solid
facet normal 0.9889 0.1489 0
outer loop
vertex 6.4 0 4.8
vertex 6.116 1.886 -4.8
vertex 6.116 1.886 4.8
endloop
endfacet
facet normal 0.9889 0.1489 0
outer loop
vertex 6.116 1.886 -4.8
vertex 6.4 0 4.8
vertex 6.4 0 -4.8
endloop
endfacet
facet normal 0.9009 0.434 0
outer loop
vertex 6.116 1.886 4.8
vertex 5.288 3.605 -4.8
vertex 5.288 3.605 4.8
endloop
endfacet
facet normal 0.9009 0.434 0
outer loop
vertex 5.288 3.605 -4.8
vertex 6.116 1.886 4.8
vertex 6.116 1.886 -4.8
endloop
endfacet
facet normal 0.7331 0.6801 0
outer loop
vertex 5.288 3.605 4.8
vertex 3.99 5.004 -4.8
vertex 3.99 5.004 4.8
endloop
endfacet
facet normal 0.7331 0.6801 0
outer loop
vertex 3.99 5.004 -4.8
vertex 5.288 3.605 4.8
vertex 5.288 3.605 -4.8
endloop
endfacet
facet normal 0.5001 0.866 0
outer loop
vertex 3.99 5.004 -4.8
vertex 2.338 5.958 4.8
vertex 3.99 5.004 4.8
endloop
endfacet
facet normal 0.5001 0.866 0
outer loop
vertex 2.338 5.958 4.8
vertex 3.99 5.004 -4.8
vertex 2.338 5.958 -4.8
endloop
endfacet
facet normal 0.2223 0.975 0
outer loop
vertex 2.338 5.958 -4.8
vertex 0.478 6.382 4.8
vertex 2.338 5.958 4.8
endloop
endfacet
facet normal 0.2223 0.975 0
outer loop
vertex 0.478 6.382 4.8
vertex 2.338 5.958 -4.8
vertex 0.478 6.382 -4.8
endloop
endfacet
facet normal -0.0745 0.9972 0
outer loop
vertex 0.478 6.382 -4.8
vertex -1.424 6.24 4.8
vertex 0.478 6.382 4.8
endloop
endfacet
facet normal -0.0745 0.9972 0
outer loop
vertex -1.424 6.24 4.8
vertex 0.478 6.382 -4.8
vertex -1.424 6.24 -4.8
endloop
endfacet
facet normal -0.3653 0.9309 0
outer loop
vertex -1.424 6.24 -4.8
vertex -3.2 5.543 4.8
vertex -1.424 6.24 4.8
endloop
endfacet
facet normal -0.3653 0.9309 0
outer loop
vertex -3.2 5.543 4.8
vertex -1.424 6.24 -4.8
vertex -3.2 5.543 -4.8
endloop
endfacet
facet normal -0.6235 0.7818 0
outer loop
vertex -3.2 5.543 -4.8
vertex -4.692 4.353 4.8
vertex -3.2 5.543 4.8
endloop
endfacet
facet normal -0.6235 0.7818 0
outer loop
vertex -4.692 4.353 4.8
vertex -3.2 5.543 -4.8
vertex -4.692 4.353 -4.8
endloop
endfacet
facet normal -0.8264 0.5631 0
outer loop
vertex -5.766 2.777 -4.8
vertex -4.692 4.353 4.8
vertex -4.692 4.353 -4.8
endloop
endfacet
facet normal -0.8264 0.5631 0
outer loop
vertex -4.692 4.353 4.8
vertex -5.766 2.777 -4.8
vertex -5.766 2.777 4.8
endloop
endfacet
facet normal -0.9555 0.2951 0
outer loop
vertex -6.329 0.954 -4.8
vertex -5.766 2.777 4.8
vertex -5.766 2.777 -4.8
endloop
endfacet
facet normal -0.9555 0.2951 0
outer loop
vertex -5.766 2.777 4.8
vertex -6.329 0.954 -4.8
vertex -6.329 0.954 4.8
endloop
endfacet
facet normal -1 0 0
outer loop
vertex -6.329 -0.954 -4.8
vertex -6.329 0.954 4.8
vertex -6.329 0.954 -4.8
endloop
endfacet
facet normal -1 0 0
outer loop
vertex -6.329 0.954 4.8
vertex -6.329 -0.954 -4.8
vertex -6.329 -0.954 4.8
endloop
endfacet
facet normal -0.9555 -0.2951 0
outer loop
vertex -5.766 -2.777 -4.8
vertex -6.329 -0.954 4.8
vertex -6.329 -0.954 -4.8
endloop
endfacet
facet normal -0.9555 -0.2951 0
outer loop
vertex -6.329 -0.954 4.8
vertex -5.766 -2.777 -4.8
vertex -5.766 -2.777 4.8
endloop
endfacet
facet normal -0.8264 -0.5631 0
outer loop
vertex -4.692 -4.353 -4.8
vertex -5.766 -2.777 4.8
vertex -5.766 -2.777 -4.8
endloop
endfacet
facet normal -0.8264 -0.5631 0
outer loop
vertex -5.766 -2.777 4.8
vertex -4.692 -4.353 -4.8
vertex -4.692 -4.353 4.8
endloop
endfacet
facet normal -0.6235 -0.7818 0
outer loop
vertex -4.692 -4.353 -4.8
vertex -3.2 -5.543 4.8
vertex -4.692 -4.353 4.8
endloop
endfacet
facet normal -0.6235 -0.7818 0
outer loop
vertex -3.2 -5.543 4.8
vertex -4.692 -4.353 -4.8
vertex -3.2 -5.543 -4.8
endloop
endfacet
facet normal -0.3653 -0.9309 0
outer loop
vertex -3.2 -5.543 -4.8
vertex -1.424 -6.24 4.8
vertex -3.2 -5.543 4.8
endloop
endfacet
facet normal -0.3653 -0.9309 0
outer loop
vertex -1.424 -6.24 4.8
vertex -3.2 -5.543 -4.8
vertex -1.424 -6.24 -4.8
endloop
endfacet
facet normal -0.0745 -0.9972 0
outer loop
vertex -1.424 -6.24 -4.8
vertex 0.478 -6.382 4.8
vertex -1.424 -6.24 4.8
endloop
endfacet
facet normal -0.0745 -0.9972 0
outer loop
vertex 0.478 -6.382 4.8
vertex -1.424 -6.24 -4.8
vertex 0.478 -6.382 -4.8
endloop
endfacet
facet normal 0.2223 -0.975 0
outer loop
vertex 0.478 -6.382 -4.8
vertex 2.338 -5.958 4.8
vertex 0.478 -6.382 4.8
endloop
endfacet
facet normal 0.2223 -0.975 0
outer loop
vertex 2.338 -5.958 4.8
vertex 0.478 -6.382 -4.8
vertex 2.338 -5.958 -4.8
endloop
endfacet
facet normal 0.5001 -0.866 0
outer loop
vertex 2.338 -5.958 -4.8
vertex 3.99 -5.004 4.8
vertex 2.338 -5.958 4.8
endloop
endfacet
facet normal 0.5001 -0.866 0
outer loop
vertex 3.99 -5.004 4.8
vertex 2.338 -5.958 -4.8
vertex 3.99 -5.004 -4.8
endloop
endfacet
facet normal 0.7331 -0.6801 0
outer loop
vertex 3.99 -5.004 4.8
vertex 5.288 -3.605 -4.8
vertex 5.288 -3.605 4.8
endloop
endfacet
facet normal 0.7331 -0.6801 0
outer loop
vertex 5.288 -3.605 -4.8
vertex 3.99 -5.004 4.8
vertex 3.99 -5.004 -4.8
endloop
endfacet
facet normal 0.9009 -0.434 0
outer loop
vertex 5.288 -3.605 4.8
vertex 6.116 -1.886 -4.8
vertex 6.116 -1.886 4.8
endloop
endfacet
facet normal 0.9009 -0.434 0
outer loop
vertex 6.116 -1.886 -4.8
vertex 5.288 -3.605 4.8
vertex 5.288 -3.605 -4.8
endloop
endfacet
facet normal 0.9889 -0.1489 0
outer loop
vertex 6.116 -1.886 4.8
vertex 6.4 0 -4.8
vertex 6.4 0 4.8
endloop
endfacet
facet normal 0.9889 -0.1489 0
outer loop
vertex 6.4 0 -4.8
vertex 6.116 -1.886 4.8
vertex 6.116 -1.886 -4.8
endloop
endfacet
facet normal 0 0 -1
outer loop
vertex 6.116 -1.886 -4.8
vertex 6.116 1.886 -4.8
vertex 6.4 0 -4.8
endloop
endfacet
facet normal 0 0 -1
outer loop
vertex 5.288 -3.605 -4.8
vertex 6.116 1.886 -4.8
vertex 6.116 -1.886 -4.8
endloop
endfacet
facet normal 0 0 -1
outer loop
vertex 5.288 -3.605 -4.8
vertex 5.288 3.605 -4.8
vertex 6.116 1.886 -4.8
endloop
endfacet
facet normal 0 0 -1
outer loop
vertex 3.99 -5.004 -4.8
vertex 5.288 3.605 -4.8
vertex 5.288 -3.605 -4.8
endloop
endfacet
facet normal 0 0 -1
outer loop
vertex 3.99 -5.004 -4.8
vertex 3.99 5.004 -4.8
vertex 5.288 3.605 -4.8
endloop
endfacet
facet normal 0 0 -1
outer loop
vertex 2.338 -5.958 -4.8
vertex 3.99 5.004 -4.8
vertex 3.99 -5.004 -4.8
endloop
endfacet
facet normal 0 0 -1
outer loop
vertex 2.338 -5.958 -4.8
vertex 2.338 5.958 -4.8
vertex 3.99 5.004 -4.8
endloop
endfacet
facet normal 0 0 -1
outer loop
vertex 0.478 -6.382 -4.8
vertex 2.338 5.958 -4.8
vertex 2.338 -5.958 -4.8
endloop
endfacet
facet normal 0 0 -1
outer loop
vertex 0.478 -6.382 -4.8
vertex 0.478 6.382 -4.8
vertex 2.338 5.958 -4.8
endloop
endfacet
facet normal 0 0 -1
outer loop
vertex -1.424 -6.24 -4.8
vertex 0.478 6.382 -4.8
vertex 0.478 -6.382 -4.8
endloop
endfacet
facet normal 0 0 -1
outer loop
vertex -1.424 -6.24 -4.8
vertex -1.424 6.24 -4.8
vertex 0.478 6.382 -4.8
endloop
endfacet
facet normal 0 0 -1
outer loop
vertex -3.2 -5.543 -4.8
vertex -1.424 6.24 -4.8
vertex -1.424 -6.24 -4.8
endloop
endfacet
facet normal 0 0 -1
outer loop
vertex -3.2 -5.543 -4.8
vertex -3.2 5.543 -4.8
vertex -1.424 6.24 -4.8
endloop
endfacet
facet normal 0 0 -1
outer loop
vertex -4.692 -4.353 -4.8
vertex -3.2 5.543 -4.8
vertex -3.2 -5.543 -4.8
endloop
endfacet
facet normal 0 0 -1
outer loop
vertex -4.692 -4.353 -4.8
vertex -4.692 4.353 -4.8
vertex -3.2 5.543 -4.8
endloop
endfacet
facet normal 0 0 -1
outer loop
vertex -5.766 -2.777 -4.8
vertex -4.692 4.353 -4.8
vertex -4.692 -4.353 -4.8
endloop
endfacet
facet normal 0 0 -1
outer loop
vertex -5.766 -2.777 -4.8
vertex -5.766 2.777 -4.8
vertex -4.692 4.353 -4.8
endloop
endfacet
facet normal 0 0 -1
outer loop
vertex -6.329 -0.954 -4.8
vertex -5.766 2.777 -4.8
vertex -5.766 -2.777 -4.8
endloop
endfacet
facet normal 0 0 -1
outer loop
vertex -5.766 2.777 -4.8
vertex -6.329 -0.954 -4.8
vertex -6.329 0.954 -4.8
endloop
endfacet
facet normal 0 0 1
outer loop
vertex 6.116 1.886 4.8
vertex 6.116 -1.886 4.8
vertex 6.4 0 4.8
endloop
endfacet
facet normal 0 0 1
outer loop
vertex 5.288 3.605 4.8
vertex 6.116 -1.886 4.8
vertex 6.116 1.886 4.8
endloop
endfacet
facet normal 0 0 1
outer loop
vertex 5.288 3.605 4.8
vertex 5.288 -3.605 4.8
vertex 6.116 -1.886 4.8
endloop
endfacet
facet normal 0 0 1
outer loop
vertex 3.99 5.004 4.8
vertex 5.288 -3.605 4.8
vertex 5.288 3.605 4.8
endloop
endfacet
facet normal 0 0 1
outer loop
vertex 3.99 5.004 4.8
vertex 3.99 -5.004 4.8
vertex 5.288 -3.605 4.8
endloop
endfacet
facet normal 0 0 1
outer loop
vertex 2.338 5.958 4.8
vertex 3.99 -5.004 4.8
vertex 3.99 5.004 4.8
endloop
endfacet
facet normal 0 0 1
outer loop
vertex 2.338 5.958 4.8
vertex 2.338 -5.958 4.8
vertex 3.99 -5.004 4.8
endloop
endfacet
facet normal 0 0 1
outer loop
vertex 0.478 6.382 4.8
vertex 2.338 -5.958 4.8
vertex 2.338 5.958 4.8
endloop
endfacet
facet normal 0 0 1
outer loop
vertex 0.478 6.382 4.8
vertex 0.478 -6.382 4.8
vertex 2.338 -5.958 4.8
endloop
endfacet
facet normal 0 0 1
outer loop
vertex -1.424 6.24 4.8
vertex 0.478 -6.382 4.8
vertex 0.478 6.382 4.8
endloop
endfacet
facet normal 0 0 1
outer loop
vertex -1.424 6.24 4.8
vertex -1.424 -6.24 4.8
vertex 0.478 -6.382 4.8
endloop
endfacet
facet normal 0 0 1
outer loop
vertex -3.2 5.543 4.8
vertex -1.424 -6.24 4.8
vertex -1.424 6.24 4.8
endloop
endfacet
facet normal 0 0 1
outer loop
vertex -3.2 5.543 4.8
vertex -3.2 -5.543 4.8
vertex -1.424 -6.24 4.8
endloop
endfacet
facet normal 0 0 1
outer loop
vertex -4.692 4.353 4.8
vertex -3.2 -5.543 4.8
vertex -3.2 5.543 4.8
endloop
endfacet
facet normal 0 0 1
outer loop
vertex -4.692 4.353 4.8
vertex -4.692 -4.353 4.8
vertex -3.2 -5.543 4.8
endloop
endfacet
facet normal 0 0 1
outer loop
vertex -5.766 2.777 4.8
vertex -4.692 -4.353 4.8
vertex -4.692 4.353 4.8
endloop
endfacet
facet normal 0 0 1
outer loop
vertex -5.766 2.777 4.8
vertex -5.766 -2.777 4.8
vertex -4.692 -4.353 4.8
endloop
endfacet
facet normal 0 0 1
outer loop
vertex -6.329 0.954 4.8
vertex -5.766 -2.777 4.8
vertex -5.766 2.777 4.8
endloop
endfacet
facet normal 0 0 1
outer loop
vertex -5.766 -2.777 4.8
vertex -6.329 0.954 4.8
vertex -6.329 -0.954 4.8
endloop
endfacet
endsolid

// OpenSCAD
// file: ../configurations/global.scad
housing_facades_throws_diameter = 3.8;

// external size
case_external_x_size = 90;
case_external_y_size = 140;
case_external_z_size = 38;
case_external_panes_thickness = 4.8;

facade_front_round_edges_radius = 5;
facade_throws_margin = 5;

facade_front_fixation_throws_diameter = housing_facades_throws_diameter;

// facade corners
facade_corners_offset_lenght = 9;
facade_corners_main_x_size = 19;
facade_corners_main_y_size = 19;
facade_corners_main_thickness = 11;
facade_corners_correction_offset_length = 0.2;
facade_corners_correction_offset_thickness = 0.0;
facade_fn = 100;


facade_controller_coords = [
    case_external_x_size / 2,
    case_external_y_size / 2 - 30,
];


// Screen frames
screen_frame_electronic_board_margin = 3;
screen_frame_throw_diameter = 3.5;
screen_frame_piece_z_size = 1.5;
screen_frame_piece_glass_embedding_margin = 1;
screen_frame_piece_glass_embedding_z_depth = 1;
screen_frame_facade_piece_z_size = 1;
screen_frame_fn = 100;

screen_glass_visible_zone_x_margin = 0.7;
screen_glass_visible_zone_y_margin = 0.7;
screen_glass_z_size = 1;

facade_screen_coords = [
    case_external_x_size / 2,
    case_external_y_size / 2 + 28,
];


// Generics
insert_throw_diameter = 4.2;
insert_throw_length = 6 + 2;


// Controller facade
controller_breadboard_x_size_point = 28;
controller_breadboard_y_size_point = 9;

controller_facade_z_size = 2;
controller_facade_button_throw_margin = 1;
controller_facade_small_button_throw_margin = 0.5;
controller_facade_a_b_button_throw_margin = 0.5;

controller_facade_border_rounded_border_1 = 5;
controller_facade_border_rounded_border_2 = 4;

controller_facade_with_border_x_size = 82;
controller_facade_with_border_y_size = 47;

controller_facade_border_throws_margin = 5;
controller_braidboard_throw_margin = 1;

controller_facade_border_fn = 80;


// Cross Button
controller_cross_button_x_y_size = 20;
controller_cross_button_z_size = 4;
controller_cross_button_thickness = 6;
controller_cross_button_round_edges_radius = 1;
controller_cross_button_support_x_y_size = 22;
controller_cross_button_support_z_size = 1;
controller_cross_button_fn = 150;


// A and B Buttons
controller_a_b_button_diameter = 7.5;
controller_a_b_button_z_size = 4;
controller_a_b_button_support_diameter = 9.5;
controller_a_b_button_support_z_size = 1;
controller_a_b_button_fn = 80;


// small Buttons
controller_small_button_diameter = 5.5;
controller_small_button_z_size = 3;
controller_small_button_support_diameter = 7.5;
controller_small_button_support_z_size = 1;
controller_small_button_fn = 80;

// Directional cross
controller_directional_cross_points_coords = [6, 5];
controller_start_button_points_coords = [14, 3];
controller_select_button_points_coords = [18, 3];
controller_menu_button_points_coords = [14, 7];
controller_option_button_points_coords = [18, 7];
controller_a_button_points_coords = [23, 4];
controller_b_button_points_coords = [27, 6];
controller_bolt_throws_list = [
    [2, 2],
    [2, 8],
    [10, 2],
    [10, 8],
    [27, 2],
    [23, 8],
];


// usb charger holder
usb_charger_support_total_x_size = 17.57 + 15;
usb_charger_support_total_y_size = 12;
usb_charger_support_total_z_size = 2;


usb_charger_fixation_support_z_size = 4.5;
usb_charger_encaps_x_size = 17.57 + 1;
usb_charger_encaps_y_size = 27.85 + 1;
usb_charger_encaps_z_size = 1;

usb_charger_facade_x_fixation_spacing = 42;
usb_charger_facade_y_size = 1.36;
usb_charger_facade_z_size = 14;

usb_charger_throw_diameter = 3.5;
usb_charger_facade_holder_z_offset = 3.5; //
usb_charger_fixation_facade_y_margin = 0.5;
usb_charger_throw_offset_y = 4.5;
usb_charger_throw_offset_x = 3.5;
usb_charger_facade_fn = 100;

usb_charger_external_facade_main_throw_margin = 2;
usb_charger_external_facade_main_throw_diameter = housing_facades_throws_diameter;

usb_charger_coords = [
    28, 15
];


facade_top_on_off_button_throw_diameter = 12.8;

facade_top_on_off_button_coords = [
    case_external_x_size / 2 + 18,
    case_external_z_size / 2
];


// Bolt join Piece Mother board
bolt_join_mother_board_internal_diameter = 3.5;
bolt_join_mother_board_external_diameter = 3.5 + (0.4 * 6);
bolt_join_mother_board_height = 3;

// Bolt join Piece GamePadController
bolt_join_game_pad_internal_diameter = 3.5;
bolt_join_game_pad_external_diameter = 3.5 + (0.4 * 6);
bolt_join_game_pad_height = 6.5;

bolt_join_fn = 500;


// Mother board breadboard
mother_board_x_size_point = 25;
mother_board_y_size_point = 32;

mother_board_coords = [
    case_external_x_size / 2 - ((mother_board_x_size_point + 1) * 2.54) / 2,
    44,
    3
];

mother_board_bolt_throws_list = [
    [3, 2],
    [3, 17],
    [23, 2],
    [23, 17],
];


// Speaker
speaker_facade_throw_diameter = 28 + 1;
speaker_facade_z_size = 1.36;
speaker_facade_rounded_radius = 5;
// main file
include <../configurations/global.scad>

/**
 * onOffButtonThrowEnveloppe
 * @name onOffButtonThrowEnveloppe
 * @description onOffButtonThrowEnveloppe
 * @type enveloppe
 * @parent root
 */
module onOffButtonThrowEnveloppe(
    z_size = case_external_panes_thickness * 2,
    throw_diameter = facade_top_on_off_button_throw_diameter
) {
    cylinder(h = z_size, d = throw_diameter, center = true, $fn = $fn);
}

onOffButtonThrowEnveloppe();
